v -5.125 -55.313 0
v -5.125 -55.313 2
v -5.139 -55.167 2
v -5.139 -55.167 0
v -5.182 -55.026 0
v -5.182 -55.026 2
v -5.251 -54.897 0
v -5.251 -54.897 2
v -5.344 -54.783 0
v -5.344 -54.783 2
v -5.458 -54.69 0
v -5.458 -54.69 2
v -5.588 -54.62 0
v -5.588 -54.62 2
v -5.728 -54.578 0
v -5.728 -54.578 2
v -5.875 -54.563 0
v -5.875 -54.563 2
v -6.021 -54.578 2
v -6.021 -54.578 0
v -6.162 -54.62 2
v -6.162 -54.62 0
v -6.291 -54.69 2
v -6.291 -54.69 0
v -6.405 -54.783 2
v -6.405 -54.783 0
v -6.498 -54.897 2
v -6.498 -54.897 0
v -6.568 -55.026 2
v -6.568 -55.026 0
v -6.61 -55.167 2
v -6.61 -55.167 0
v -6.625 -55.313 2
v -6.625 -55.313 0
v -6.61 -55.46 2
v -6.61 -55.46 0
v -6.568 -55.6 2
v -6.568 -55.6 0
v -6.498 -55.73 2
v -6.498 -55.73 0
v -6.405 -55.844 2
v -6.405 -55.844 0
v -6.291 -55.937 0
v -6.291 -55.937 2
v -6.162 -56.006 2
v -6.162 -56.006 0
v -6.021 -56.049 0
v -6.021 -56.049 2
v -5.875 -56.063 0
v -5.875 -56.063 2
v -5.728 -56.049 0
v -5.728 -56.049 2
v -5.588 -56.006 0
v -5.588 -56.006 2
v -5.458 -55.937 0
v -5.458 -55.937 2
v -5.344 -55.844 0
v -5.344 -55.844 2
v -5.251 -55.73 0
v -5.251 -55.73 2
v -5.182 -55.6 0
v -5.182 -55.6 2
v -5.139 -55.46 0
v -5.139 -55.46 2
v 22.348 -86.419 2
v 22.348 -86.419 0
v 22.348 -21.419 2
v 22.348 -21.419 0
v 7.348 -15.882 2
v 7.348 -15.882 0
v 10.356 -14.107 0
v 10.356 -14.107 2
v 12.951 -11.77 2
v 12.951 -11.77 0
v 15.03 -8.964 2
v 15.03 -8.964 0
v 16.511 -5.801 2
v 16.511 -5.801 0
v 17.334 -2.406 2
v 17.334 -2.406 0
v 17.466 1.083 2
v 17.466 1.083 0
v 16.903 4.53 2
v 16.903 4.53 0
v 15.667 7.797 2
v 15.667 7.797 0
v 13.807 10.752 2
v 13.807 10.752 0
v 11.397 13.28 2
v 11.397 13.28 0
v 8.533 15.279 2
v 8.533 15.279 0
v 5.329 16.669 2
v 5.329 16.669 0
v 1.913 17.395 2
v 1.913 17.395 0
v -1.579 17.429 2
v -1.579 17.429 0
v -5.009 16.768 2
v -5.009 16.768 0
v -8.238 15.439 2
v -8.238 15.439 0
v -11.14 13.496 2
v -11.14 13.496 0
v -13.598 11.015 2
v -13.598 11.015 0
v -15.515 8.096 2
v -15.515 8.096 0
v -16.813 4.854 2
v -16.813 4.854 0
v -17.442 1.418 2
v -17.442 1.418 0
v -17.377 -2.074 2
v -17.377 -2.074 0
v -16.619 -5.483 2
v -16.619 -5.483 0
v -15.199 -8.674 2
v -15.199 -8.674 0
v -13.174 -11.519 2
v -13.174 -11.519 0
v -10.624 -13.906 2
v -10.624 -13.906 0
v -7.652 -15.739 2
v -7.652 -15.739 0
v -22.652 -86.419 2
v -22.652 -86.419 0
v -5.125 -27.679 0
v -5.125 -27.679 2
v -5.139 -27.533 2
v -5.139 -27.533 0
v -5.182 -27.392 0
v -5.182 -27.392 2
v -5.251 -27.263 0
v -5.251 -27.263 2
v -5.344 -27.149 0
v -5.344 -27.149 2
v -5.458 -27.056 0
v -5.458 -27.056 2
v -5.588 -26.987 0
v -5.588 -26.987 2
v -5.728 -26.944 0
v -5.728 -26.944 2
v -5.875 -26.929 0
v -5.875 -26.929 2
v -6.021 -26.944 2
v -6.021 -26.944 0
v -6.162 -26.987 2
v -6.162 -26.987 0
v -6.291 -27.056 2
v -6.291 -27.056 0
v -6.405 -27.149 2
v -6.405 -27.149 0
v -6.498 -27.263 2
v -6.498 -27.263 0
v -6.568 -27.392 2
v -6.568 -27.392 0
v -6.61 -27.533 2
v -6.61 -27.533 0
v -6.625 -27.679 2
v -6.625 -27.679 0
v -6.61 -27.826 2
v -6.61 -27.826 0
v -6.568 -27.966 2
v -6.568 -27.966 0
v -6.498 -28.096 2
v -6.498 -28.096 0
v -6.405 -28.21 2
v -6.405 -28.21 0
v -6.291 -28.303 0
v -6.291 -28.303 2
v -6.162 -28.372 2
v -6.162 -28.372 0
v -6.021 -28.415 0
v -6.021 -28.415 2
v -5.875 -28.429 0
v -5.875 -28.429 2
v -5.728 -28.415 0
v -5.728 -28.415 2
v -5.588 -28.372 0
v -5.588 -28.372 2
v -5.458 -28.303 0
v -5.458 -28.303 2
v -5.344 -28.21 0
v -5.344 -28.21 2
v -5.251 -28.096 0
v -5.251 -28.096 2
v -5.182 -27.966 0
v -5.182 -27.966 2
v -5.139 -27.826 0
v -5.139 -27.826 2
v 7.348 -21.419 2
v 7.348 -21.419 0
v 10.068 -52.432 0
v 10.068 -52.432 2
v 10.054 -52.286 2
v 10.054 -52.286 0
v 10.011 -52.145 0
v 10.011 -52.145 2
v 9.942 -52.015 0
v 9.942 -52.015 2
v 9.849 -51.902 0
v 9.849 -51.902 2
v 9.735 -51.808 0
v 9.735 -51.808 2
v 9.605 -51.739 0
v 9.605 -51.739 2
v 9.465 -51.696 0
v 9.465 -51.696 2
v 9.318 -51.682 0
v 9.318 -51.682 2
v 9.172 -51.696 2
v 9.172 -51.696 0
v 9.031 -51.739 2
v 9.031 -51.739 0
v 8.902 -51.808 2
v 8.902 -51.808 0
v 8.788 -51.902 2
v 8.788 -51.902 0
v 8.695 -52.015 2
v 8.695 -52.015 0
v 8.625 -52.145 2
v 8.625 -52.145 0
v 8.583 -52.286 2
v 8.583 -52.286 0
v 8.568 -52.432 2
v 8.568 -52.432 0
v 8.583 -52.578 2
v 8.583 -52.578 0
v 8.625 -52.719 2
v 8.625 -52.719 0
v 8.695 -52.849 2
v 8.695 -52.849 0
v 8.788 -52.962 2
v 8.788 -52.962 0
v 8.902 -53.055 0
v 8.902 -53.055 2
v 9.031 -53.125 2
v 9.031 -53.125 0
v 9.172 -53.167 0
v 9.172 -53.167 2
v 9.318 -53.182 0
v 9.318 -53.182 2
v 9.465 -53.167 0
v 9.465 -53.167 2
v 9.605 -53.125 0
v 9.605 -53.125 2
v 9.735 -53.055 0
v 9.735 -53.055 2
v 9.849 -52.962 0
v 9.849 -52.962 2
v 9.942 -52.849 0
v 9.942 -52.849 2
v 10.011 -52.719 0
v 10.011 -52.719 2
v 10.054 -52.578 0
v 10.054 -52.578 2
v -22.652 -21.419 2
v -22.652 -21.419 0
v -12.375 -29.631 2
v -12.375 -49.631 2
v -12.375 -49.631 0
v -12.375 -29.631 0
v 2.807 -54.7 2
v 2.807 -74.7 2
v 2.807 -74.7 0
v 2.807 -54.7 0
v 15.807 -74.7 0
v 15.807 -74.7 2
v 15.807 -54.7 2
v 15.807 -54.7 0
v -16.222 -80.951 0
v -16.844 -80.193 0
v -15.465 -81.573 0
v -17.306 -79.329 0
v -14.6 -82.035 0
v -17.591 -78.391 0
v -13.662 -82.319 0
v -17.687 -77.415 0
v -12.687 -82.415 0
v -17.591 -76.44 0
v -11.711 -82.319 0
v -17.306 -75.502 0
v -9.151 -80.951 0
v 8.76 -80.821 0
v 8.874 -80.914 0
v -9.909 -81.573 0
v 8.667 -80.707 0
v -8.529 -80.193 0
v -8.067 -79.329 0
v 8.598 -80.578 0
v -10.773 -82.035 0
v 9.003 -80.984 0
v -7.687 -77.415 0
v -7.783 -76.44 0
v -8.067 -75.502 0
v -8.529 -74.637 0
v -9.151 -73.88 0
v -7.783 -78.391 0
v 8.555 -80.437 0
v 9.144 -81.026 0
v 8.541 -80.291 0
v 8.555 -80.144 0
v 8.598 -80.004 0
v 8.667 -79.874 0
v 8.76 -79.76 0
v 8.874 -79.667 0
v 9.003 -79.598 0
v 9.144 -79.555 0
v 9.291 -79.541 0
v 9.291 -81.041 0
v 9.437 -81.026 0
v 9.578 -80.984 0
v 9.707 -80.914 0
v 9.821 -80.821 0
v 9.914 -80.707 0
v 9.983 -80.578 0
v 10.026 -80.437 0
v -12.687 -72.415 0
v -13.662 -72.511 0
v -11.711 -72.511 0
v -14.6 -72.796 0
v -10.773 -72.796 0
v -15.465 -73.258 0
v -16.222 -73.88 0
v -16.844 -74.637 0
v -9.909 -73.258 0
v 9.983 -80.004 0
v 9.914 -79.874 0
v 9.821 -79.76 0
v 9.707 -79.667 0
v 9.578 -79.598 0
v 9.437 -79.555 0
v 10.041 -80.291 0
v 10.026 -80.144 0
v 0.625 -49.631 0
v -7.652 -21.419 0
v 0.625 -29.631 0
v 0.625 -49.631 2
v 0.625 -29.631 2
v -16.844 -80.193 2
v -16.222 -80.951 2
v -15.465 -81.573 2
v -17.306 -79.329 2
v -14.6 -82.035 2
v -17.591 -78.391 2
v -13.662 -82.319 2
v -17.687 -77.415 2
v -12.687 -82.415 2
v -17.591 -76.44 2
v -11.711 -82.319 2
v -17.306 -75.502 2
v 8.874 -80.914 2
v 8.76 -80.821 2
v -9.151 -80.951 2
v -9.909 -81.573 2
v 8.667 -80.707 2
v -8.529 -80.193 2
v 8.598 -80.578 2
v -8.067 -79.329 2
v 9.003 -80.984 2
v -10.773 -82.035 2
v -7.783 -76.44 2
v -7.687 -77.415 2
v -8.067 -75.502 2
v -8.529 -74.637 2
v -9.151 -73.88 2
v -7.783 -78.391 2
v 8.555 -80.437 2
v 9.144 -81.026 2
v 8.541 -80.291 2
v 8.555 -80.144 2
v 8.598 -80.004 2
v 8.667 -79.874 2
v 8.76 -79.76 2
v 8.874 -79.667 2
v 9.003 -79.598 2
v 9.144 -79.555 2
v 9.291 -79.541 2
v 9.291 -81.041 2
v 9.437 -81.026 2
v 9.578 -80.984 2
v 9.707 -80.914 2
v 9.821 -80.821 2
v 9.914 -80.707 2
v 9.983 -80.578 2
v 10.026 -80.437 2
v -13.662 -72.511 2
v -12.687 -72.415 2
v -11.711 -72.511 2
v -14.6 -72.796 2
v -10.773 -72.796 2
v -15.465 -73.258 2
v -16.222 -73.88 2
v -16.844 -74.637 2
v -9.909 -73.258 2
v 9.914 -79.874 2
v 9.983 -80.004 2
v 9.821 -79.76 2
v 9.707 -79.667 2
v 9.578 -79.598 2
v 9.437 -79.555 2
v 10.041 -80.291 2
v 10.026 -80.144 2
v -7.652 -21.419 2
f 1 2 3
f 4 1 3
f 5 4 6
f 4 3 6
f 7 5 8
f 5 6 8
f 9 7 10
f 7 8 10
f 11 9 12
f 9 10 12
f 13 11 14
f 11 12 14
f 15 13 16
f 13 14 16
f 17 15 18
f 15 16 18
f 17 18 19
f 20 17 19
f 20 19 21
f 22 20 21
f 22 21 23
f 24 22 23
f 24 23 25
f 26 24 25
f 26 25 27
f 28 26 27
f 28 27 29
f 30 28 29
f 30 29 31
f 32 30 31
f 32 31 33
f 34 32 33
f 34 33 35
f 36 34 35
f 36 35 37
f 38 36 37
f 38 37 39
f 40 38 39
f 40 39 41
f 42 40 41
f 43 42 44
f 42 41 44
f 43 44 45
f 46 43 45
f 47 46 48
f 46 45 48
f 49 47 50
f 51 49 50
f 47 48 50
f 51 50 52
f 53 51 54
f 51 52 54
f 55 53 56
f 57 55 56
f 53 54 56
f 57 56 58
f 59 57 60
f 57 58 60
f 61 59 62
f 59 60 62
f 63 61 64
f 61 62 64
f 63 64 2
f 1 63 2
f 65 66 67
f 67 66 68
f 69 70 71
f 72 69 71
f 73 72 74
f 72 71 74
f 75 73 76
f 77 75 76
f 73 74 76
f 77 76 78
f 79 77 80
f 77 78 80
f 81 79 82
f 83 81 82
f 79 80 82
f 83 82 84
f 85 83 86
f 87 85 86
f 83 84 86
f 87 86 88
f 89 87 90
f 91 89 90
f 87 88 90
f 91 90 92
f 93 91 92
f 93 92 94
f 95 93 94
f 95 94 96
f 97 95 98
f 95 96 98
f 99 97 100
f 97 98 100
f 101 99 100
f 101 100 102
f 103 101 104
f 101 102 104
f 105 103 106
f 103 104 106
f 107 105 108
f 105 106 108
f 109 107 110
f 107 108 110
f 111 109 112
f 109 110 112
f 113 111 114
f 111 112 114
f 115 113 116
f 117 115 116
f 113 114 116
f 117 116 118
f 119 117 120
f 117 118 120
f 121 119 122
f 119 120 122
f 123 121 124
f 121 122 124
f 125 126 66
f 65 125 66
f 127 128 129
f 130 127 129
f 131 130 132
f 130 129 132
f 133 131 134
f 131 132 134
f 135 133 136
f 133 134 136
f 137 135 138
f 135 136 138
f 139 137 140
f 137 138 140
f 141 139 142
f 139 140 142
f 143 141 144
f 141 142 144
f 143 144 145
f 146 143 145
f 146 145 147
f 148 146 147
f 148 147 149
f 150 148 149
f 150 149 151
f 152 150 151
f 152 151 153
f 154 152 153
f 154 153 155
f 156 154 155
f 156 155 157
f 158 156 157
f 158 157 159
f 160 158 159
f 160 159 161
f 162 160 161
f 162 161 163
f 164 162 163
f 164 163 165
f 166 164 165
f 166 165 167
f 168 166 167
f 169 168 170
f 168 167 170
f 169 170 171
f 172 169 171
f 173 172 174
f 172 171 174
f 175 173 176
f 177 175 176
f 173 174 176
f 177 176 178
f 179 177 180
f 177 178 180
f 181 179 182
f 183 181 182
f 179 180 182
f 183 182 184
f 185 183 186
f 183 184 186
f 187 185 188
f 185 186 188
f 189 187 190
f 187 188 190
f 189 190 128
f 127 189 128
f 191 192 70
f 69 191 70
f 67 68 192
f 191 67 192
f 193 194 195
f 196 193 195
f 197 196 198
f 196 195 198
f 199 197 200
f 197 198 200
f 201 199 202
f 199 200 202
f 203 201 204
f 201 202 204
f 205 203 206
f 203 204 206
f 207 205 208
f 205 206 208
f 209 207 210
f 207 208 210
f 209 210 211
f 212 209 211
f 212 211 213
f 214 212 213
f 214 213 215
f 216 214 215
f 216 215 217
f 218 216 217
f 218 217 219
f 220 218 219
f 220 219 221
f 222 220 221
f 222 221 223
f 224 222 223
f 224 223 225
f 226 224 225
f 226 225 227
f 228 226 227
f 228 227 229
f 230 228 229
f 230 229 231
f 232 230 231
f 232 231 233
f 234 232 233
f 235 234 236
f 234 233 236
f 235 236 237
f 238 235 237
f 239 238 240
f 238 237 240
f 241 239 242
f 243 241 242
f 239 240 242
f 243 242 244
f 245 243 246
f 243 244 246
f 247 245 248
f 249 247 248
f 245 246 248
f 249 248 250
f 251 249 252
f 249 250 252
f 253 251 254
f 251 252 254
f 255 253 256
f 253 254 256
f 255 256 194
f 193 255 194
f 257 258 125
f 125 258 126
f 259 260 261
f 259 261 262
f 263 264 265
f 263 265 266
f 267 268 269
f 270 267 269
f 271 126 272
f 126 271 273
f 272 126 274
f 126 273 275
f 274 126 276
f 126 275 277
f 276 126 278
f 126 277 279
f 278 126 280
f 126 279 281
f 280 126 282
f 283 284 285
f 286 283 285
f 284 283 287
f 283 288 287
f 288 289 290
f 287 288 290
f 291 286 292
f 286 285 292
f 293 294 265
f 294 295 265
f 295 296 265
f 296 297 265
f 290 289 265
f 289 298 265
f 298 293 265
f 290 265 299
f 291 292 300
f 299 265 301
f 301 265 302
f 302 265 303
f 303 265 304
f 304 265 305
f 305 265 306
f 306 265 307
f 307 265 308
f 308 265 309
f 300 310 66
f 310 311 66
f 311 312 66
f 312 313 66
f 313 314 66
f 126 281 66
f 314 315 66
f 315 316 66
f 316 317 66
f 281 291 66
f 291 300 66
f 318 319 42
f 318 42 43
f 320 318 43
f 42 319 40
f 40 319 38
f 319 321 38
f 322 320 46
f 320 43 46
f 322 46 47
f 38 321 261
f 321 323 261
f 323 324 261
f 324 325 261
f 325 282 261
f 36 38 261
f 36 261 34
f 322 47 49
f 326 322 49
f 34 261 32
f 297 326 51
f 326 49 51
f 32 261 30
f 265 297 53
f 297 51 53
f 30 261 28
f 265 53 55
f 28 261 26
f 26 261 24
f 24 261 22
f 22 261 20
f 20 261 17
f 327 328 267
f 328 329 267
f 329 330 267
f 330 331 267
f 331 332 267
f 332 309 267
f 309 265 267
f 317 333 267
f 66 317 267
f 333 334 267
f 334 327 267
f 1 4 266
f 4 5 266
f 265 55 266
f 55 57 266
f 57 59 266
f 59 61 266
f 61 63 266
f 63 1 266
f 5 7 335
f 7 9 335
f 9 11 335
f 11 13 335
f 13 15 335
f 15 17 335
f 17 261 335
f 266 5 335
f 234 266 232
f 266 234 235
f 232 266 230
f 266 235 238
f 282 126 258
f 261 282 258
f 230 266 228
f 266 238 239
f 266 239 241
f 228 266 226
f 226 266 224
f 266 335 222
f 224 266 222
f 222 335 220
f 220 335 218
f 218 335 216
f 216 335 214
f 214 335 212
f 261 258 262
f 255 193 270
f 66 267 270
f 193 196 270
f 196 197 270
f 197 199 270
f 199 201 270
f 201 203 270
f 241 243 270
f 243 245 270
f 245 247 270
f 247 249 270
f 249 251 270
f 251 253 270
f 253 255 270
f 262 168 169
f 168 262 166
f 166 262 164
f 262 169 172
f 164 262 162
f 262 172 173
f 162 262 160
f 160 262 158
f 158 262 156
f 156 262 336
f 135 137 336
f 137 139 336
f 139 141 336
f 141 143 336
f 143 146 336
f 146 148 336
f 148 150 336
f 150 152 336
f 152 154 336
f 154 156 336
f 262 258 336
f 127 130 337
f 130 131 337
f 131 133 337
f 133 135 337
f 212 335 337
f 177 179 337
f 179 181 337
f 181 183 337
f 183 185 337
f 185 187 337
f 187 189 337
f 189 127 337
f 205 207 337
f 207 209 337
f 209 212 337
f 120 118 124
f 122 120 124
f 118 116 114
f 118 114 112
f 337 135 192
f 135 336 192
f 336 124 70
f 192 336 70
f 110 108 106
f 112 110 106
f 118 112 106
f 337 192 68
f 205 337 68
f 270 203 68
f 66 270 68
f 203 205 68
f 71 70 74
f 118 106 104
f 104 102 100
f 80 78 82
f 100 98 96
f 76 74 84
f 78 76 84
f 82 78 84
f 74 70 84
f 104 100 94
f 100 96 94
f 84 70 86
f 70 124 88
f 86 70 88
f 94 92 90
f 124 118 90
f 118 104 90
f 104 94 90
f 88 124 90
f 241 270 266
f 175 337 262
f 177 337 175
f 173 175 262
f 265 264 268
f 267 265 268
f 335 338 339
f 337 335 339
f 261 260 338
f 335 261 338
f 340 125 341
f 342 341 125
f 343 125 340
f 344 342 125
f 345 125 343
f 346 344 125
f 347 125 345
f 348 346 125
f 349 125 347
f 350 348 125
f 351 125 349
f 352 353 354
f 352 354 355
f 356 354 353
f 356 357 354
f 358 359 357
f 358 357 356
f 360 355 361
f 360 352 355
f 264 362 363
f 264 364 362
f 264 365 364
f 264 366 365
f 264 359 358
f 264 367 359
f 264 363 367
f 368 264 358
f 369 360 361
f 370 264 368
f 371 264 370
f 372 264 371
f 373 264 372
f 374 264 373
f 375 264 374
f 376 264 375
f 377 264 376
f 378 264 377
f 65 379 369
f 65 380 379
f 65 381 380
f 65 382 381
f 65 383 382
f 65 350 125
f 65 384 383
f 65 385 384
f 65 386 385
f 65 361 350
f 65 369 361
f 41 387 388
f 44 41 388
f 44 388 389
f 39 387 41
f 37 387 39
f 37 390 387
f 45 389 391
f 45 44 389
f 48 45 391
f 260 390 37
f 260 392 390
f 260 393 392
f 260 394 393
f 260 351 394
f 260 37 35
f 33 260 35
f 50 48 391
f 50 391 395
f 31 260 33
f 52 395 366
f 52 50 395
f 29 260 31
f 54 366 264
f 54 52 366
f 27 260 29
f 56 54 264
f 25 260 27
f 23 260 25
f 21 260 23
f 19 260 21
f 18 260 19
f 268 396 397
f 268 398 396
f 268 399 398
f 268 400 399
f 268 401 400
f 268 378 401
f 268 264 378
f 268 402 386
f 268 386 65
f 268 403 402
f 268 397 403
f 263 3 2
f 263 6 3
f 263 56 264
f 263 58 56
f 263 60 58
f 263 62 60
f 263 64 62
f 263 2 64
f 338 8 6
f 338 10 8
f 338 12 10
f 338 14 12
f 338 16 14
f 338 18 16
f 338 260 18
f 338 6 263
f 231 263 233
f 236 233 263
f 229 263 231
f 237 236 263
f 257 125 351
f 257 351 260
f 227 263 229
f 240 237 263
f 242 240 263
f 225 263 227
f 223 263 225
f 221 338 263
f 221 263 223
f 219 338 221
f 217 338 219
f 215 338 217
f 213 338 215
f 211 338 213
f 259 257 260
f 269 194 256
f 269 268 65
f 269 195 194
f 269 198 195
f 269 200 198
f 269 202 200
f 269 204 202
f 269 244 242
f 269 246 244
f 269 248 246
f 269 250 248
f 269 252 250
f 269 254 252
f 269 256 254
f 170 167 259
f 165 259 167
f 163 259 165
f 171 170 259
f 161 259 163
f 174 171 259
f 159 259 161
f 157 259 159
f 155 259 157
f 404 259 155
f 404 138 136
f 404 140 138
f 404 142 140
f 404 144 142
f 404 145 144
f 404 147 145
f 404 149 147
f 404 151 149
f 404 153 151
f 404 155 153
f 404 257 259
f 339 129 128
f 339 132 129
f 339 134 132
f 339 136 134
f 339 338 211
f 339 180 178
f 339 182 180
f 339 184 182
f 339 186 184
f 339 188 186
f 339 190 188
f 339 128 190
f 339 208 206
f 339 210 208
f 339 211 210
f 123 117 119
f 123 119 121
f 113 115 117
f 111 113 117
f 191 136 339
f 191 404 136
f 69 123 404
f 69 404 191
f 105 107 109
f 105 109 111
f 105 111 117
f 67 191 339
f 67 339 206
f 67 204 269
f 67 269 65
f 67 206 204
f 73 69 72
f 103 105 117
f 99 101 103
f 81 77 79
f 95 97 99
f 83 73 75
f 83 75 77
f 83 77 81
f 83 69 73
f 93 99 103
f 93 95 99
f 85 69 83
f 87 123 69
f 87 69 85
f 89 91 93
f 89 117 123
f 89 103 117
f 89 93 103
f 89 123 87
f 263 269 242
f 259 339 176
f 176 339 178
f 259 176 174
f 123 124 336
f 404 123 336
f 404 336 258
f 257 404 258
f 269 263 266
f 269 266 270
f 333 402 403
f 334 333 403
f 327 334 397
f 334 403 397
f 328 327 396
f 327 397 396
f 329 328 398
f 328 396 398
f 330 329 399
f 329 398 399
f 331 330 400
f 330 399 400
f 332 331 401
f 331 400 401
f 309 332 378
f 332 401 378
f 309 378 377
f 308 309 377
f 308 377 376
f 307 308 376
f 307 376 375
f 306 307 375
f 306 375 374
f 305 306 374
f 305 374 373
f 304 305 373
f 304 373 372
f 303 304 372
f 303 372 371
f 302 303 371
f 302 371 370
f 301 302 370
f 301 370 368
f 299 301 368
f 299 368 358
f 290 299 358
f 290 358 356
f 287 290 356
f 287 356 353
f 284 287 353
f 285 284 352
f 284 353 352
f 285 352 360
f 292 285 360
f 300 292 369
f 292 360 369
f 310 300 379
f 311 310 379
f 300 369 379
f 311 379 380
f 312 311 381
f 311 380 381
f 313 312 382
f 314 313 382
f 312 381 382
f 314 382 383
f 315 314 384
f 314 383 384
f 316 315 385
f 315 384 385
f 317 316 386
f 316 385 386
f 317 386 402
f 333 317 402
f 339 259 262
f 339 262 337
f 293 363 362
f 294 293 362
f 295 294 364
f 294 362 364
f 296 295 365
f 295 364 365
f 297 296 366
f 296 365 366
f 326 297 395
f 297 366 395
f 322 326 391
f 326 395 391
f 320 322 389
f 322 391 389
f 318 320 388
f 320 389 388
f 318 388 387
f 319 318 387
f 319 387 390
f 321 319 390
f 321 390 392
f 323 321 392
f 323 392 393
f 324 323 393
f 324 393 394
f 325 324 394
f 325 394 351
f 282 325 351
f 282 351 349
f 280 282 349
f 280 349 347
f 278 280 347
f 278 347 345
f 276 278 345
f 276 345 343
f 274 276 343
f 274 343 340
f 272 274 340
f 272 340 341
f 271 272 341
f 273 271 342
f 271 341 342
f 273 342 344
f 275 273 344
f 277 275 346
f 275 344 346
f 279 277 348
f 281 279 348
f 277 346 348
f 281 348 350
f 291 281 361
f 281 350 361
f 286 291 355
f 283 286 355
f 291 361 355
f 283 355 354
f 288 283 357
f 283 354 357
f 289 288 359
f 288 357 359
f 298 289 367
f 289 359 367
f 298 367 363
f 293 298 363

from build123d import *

# Parameters (mm, degrees)
BOSS_EXTRUDE1_DEPTH = 2
SKETCH3_W           = 13
SKETCH3_H           = 20
CUT_EXTRUDE1_DEPTH  = 11.5
SKETCH4_R           = 0.75
CUT_EXTRUDE2_DEPTH  = 4.5
SKETCH5_R           = 5
CUT_EXTRUDE3_DEPTH  = 10


with BuildPart() as part:
    # Sketch2 → Boss-Extrude1 (new body)
    with BuildSketch(Plane.XY):
        with BuildLine():
            Line((-7.651598568, -15.738584414), (-7.651598568, -21.41907999))
            Line((-7.651598568, -21.41907999), (-22.651598568, -21.41907999))
            Line((-22.651598568, -21.41907999), (-22.651598568, -86.41907999))
            Line((-22.651598568, -86.41907999), (22.348401432, -86.41907999))
            Line((22.348401432, -86.41907999), (22.348401432, -21.41907999))
            Line((22.348401432, -21.41907999), (7.348401432, -21.41907999))
            Line((7.348401432, -21.41907999), (7.348401432, -15.882411542))
            ThreePointArc((7.348401432, -15.882411542), (0.167790603, 17.49919559), (-7.651598568, -15.738584414))
        make_face()
    extrude(amount=BOSS_EXTRUDE1_DEPTH)

    # Sketch3 → Cut-Extrude1 (cut)
    with BuildSketch(Plane.XY.offset(2)):
        with Locations((9.306683573, -64.699747406)):
            Rectangle(SKETCH3_W, SKETCH3_H)
        with Locations((-5.874609334, -39.631347468)):
            Rectangle(SKETCH3_W, SKETCH3_H)
    extrude(amount=-CUT_EXTRUDE1_DEPTH, mode=Mode.SUBTRACT)

    # Sketch4 → Cut-Extrude2 (cut)
    with BuildSketch(Plane.XY.offset(2)):
        with Locations((-5.874609334, -27.679486822)):
            Circle(SKETCH4_R)
        with Locations((-5.874609334, -55.313369489)):
            Circle(SKETCH4_R)
        with Locations((9.318214062, -52.431887672)):
            Circle(SKETCH4_R)
        with Locations((9.290500092, -80.290661027)):
            Circle(SKETCH4_R)
    extrude(amount=-CUT_EXTRUDE2_DEPTH, mode=Mode.SUBTRACT)

    # Sketch5 → Cut-Extrude3 (cut)
    with BuildSketch(Plane.XY.offset(2)):
        with Locations((-12.686703833, -77.415205598)):
            Circle(SKETCH5_R)
    extrude(amount=-CUT_EXTRUDE3_DEPTH, mode=Mode.SUBTRACT)


solid = part.part
